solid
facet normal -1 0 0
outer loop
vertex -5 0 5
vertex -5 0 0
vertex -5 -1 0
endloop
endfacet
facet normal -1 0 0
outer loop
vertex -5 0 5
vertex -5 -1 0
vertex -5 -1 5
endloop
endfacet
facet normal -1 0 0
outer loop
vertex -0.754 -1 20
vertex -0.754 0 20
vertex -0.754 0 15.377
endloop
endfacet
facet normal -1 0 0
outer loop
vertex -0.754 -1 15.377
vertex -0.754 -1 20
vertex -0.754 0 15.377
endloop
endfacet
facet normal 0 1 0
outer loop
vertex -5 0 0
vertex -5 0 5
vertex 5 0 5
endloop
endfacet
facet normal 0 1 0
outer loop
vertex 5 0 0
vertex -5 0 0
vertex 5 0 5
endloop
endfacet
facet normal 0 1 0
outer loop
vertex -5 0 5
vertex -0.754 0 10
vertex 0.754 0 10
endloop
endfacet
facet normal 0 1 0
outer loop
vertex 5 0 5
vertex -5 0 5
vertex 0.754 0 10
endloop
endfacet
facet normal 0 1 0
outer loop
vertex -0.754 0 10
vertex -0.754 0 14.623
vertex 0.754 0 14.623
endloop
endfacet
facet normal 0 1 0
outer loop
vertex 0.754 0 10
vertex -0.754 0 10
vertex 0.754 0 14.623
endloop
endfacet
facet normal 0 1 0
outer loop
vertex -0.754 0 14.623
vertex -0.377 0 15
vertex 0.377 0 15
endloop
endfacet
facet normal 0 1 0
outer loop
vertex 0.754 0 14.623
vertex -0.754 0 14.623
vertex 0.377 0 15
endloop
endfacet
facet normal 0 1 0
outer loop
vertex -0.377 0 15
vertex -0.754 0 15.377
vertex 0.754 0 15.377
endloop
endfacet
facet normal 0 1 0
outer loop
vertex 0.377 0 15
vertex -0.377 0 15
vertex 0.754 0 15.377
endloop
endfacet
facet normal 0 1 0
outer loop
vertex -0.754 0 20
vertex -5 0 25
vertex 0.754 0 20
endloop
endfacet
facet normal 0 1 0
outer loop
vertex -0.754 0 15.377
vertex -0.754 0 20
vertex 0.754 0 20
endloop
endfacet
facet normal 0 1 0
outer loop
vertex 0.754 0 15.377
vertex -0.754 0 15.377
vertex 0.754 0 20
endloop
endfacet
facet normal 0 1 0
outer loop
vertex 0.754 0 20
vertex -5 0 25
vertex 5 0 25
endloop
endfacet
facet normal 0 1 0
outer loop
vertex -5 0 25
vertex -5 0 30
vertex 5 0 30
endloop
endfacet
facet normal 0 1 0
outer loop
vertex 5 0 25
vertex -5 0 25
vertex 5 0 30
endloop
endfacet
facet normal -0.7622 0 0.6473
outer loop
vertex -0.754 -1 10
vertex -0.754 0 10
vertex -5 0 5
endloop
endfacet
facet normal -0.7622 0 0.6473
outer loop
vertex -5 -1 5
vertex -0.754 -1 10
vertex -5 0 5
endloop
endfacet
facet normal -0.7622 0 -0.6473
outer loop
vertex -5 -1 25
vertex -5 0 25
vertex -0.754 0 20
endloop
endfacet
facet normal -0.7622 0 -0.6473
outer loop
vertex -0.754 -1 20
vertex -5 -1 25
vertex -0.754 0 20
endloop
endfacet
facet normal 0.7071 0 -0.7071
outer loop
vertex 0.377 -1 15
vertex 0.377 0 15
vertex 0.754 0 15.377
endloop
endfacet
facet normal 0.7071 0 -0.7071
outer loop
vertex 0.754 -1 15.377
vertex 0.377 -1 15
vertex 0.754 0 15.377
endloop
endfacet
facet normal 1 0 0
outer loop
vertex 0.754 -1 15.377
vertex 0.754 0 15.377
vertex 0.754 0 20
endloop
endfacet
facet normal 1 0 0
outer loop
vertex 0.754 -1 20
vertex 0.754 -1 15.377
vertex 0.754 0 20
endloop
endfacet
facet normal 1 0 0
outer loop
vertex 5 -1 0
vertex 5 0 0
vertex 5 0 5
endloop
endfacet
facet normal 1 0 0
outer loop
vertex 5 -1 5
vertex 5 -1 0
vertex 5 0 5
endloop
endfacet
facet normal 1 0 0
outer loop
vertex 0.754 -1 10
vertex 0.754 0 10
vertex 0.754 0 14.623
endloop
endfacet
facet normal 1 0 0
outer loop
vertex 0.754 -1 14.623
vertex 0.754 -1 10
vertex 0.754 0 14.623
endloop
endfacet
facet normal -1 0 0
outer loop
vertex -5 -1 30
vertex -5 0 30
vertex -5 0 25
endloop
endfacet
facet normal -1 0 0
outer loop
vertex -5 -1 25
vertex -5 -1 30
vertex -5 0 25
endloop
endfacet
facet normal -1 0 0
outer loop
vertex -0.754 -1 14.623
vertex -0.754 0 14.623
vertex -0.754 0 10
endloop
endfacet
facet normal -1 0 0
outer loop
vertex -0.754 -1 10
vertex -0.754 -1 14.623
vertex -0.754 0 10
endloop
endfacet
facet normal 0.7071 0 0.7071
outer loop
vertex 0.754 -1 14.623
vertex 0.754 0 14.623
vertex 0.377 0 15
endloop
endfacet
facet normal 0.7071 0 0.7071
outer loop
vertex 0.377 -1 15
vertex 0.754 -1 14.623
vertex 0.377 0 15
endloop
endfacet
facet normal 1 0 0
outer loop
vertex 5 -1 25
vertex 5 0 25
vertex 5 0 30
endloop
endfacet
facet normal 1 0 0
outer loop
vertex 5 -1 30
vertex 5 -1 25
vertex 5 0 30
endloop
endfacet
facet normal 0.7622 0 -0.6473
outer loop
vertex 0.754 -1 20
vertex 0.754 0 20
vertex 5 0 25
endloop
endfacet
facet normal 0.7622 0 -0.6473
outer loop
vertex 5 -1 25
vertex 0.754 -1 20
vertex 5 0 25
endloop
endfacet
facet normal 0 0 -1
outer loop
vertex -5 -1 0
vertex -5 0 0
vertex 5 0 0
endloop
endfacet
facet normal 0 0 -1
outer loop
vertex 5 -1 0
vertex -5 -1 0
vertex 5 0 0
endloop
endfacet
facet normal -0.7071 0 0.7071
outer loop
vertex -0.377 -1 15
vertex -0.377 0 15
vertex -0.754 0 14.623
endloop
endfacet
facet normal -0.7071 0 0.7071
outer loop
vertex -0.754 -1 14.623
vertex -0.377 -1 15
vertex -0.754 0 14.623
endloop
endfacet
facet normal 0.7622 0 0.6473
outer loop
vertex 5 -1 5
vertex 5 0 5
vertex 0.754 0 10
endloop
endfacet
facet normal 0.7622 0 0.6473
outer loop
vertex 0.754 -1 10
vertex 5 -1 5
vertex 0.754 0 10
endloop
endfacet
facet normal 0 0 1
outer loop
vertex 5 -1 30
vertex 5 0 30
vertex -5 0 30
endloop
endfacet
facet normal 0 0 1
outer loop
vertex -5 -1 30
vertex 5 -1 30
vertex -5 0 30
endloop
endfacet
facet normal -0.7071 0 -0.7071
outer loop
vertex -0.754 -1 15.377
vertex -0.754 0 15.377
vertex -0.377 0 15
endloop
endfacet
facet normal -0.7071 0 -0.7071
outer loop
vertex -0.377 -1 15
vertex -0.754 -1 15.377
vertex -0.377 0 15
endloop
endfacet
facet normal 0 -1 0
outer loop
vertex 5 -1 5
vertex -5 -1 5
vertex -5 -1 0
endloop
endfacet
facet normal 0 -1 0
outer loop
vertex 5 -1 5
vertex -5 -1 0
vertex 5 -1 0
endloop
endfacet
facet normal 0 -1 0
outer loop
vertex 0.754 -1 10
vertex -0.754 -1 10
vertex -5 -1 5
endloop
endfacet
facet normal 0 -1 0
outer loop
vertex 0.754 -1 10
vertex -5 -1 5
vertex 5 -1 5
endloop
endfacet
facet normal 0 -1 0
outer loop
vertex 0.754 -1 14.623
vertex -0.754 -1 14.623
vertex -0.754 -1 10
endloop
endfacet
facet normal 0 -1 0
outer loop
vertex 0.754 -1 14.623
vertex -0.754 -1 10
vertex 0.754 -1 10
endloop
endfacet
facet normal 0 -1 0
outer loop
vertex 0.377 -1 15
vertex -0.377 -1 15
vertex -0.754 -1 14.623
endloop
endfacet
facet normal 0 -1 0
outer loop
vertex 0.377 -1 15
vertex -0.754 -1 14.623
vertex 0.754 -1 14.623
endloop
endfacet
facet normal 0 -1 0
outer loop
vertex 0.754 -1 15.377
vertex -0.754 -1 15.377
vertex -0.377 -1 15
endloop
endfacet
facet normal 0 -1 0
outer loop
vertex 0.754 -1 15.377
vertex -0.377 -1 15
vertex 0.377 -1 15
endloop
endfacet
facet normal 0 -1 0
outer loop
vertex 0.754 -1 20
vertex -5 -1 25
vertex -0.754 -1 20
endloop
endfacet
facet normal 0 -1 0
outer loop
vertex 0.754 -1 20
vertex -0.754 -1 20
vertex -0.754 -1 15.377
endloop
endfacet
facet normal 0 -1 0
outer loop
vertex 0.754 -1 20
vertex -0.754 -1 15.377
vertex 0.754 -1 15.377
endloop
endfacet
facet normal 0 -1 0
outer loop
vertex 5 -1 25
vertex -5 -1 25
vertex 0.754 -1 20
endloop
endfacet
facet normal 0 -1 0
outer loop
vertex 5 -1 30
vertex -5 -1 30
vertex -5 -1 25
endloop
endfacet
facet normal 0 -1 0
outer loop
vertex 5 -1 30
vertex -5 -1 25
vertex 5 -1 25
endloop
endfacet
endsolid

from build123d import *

# Parameters (mm, degrees)
F0_W     = 10
F0_H     = 5
F1_DEPTH = 1


with BuildPart() as f1:
    # F0 (on Front) → F1 (new body)
    with BuildSketch(Plane.XZ):
        Polygon((-0.377013, 15.377013), (-0.377013, 15), (0, 15), (0.377013, 15), (0.754026, 15.377013), (0.754026, 20), (-0.754026, 20), (-0.754026, 15.377013), align=None)
        with Locations((0, 2.5)):
            Rectangle(F0_W, F0_H)
        Polygon((-5, 25), (-0.754026, 20), (0.754026, 20), (5, 25), (5, 30), (-5, 30), align=None)
        Polygon((-0.754026, 10), (-5, 5), (5, 5), (0.754026, 10), align=None)
        Polygon((-0.754026, 14.622987), (-0.754026, 10), (0.754026, 10), (0.754026, 14.622987), (0.377013, 15), (0, 15), (-0.377013, 15), align=None)
        Polygon((-0.754026, 15.377013), (-0.377013, 15), (-0.377013, 15.377013), align=None)
    extrude(amount=F1_DEPTH)


solid = f1.part
